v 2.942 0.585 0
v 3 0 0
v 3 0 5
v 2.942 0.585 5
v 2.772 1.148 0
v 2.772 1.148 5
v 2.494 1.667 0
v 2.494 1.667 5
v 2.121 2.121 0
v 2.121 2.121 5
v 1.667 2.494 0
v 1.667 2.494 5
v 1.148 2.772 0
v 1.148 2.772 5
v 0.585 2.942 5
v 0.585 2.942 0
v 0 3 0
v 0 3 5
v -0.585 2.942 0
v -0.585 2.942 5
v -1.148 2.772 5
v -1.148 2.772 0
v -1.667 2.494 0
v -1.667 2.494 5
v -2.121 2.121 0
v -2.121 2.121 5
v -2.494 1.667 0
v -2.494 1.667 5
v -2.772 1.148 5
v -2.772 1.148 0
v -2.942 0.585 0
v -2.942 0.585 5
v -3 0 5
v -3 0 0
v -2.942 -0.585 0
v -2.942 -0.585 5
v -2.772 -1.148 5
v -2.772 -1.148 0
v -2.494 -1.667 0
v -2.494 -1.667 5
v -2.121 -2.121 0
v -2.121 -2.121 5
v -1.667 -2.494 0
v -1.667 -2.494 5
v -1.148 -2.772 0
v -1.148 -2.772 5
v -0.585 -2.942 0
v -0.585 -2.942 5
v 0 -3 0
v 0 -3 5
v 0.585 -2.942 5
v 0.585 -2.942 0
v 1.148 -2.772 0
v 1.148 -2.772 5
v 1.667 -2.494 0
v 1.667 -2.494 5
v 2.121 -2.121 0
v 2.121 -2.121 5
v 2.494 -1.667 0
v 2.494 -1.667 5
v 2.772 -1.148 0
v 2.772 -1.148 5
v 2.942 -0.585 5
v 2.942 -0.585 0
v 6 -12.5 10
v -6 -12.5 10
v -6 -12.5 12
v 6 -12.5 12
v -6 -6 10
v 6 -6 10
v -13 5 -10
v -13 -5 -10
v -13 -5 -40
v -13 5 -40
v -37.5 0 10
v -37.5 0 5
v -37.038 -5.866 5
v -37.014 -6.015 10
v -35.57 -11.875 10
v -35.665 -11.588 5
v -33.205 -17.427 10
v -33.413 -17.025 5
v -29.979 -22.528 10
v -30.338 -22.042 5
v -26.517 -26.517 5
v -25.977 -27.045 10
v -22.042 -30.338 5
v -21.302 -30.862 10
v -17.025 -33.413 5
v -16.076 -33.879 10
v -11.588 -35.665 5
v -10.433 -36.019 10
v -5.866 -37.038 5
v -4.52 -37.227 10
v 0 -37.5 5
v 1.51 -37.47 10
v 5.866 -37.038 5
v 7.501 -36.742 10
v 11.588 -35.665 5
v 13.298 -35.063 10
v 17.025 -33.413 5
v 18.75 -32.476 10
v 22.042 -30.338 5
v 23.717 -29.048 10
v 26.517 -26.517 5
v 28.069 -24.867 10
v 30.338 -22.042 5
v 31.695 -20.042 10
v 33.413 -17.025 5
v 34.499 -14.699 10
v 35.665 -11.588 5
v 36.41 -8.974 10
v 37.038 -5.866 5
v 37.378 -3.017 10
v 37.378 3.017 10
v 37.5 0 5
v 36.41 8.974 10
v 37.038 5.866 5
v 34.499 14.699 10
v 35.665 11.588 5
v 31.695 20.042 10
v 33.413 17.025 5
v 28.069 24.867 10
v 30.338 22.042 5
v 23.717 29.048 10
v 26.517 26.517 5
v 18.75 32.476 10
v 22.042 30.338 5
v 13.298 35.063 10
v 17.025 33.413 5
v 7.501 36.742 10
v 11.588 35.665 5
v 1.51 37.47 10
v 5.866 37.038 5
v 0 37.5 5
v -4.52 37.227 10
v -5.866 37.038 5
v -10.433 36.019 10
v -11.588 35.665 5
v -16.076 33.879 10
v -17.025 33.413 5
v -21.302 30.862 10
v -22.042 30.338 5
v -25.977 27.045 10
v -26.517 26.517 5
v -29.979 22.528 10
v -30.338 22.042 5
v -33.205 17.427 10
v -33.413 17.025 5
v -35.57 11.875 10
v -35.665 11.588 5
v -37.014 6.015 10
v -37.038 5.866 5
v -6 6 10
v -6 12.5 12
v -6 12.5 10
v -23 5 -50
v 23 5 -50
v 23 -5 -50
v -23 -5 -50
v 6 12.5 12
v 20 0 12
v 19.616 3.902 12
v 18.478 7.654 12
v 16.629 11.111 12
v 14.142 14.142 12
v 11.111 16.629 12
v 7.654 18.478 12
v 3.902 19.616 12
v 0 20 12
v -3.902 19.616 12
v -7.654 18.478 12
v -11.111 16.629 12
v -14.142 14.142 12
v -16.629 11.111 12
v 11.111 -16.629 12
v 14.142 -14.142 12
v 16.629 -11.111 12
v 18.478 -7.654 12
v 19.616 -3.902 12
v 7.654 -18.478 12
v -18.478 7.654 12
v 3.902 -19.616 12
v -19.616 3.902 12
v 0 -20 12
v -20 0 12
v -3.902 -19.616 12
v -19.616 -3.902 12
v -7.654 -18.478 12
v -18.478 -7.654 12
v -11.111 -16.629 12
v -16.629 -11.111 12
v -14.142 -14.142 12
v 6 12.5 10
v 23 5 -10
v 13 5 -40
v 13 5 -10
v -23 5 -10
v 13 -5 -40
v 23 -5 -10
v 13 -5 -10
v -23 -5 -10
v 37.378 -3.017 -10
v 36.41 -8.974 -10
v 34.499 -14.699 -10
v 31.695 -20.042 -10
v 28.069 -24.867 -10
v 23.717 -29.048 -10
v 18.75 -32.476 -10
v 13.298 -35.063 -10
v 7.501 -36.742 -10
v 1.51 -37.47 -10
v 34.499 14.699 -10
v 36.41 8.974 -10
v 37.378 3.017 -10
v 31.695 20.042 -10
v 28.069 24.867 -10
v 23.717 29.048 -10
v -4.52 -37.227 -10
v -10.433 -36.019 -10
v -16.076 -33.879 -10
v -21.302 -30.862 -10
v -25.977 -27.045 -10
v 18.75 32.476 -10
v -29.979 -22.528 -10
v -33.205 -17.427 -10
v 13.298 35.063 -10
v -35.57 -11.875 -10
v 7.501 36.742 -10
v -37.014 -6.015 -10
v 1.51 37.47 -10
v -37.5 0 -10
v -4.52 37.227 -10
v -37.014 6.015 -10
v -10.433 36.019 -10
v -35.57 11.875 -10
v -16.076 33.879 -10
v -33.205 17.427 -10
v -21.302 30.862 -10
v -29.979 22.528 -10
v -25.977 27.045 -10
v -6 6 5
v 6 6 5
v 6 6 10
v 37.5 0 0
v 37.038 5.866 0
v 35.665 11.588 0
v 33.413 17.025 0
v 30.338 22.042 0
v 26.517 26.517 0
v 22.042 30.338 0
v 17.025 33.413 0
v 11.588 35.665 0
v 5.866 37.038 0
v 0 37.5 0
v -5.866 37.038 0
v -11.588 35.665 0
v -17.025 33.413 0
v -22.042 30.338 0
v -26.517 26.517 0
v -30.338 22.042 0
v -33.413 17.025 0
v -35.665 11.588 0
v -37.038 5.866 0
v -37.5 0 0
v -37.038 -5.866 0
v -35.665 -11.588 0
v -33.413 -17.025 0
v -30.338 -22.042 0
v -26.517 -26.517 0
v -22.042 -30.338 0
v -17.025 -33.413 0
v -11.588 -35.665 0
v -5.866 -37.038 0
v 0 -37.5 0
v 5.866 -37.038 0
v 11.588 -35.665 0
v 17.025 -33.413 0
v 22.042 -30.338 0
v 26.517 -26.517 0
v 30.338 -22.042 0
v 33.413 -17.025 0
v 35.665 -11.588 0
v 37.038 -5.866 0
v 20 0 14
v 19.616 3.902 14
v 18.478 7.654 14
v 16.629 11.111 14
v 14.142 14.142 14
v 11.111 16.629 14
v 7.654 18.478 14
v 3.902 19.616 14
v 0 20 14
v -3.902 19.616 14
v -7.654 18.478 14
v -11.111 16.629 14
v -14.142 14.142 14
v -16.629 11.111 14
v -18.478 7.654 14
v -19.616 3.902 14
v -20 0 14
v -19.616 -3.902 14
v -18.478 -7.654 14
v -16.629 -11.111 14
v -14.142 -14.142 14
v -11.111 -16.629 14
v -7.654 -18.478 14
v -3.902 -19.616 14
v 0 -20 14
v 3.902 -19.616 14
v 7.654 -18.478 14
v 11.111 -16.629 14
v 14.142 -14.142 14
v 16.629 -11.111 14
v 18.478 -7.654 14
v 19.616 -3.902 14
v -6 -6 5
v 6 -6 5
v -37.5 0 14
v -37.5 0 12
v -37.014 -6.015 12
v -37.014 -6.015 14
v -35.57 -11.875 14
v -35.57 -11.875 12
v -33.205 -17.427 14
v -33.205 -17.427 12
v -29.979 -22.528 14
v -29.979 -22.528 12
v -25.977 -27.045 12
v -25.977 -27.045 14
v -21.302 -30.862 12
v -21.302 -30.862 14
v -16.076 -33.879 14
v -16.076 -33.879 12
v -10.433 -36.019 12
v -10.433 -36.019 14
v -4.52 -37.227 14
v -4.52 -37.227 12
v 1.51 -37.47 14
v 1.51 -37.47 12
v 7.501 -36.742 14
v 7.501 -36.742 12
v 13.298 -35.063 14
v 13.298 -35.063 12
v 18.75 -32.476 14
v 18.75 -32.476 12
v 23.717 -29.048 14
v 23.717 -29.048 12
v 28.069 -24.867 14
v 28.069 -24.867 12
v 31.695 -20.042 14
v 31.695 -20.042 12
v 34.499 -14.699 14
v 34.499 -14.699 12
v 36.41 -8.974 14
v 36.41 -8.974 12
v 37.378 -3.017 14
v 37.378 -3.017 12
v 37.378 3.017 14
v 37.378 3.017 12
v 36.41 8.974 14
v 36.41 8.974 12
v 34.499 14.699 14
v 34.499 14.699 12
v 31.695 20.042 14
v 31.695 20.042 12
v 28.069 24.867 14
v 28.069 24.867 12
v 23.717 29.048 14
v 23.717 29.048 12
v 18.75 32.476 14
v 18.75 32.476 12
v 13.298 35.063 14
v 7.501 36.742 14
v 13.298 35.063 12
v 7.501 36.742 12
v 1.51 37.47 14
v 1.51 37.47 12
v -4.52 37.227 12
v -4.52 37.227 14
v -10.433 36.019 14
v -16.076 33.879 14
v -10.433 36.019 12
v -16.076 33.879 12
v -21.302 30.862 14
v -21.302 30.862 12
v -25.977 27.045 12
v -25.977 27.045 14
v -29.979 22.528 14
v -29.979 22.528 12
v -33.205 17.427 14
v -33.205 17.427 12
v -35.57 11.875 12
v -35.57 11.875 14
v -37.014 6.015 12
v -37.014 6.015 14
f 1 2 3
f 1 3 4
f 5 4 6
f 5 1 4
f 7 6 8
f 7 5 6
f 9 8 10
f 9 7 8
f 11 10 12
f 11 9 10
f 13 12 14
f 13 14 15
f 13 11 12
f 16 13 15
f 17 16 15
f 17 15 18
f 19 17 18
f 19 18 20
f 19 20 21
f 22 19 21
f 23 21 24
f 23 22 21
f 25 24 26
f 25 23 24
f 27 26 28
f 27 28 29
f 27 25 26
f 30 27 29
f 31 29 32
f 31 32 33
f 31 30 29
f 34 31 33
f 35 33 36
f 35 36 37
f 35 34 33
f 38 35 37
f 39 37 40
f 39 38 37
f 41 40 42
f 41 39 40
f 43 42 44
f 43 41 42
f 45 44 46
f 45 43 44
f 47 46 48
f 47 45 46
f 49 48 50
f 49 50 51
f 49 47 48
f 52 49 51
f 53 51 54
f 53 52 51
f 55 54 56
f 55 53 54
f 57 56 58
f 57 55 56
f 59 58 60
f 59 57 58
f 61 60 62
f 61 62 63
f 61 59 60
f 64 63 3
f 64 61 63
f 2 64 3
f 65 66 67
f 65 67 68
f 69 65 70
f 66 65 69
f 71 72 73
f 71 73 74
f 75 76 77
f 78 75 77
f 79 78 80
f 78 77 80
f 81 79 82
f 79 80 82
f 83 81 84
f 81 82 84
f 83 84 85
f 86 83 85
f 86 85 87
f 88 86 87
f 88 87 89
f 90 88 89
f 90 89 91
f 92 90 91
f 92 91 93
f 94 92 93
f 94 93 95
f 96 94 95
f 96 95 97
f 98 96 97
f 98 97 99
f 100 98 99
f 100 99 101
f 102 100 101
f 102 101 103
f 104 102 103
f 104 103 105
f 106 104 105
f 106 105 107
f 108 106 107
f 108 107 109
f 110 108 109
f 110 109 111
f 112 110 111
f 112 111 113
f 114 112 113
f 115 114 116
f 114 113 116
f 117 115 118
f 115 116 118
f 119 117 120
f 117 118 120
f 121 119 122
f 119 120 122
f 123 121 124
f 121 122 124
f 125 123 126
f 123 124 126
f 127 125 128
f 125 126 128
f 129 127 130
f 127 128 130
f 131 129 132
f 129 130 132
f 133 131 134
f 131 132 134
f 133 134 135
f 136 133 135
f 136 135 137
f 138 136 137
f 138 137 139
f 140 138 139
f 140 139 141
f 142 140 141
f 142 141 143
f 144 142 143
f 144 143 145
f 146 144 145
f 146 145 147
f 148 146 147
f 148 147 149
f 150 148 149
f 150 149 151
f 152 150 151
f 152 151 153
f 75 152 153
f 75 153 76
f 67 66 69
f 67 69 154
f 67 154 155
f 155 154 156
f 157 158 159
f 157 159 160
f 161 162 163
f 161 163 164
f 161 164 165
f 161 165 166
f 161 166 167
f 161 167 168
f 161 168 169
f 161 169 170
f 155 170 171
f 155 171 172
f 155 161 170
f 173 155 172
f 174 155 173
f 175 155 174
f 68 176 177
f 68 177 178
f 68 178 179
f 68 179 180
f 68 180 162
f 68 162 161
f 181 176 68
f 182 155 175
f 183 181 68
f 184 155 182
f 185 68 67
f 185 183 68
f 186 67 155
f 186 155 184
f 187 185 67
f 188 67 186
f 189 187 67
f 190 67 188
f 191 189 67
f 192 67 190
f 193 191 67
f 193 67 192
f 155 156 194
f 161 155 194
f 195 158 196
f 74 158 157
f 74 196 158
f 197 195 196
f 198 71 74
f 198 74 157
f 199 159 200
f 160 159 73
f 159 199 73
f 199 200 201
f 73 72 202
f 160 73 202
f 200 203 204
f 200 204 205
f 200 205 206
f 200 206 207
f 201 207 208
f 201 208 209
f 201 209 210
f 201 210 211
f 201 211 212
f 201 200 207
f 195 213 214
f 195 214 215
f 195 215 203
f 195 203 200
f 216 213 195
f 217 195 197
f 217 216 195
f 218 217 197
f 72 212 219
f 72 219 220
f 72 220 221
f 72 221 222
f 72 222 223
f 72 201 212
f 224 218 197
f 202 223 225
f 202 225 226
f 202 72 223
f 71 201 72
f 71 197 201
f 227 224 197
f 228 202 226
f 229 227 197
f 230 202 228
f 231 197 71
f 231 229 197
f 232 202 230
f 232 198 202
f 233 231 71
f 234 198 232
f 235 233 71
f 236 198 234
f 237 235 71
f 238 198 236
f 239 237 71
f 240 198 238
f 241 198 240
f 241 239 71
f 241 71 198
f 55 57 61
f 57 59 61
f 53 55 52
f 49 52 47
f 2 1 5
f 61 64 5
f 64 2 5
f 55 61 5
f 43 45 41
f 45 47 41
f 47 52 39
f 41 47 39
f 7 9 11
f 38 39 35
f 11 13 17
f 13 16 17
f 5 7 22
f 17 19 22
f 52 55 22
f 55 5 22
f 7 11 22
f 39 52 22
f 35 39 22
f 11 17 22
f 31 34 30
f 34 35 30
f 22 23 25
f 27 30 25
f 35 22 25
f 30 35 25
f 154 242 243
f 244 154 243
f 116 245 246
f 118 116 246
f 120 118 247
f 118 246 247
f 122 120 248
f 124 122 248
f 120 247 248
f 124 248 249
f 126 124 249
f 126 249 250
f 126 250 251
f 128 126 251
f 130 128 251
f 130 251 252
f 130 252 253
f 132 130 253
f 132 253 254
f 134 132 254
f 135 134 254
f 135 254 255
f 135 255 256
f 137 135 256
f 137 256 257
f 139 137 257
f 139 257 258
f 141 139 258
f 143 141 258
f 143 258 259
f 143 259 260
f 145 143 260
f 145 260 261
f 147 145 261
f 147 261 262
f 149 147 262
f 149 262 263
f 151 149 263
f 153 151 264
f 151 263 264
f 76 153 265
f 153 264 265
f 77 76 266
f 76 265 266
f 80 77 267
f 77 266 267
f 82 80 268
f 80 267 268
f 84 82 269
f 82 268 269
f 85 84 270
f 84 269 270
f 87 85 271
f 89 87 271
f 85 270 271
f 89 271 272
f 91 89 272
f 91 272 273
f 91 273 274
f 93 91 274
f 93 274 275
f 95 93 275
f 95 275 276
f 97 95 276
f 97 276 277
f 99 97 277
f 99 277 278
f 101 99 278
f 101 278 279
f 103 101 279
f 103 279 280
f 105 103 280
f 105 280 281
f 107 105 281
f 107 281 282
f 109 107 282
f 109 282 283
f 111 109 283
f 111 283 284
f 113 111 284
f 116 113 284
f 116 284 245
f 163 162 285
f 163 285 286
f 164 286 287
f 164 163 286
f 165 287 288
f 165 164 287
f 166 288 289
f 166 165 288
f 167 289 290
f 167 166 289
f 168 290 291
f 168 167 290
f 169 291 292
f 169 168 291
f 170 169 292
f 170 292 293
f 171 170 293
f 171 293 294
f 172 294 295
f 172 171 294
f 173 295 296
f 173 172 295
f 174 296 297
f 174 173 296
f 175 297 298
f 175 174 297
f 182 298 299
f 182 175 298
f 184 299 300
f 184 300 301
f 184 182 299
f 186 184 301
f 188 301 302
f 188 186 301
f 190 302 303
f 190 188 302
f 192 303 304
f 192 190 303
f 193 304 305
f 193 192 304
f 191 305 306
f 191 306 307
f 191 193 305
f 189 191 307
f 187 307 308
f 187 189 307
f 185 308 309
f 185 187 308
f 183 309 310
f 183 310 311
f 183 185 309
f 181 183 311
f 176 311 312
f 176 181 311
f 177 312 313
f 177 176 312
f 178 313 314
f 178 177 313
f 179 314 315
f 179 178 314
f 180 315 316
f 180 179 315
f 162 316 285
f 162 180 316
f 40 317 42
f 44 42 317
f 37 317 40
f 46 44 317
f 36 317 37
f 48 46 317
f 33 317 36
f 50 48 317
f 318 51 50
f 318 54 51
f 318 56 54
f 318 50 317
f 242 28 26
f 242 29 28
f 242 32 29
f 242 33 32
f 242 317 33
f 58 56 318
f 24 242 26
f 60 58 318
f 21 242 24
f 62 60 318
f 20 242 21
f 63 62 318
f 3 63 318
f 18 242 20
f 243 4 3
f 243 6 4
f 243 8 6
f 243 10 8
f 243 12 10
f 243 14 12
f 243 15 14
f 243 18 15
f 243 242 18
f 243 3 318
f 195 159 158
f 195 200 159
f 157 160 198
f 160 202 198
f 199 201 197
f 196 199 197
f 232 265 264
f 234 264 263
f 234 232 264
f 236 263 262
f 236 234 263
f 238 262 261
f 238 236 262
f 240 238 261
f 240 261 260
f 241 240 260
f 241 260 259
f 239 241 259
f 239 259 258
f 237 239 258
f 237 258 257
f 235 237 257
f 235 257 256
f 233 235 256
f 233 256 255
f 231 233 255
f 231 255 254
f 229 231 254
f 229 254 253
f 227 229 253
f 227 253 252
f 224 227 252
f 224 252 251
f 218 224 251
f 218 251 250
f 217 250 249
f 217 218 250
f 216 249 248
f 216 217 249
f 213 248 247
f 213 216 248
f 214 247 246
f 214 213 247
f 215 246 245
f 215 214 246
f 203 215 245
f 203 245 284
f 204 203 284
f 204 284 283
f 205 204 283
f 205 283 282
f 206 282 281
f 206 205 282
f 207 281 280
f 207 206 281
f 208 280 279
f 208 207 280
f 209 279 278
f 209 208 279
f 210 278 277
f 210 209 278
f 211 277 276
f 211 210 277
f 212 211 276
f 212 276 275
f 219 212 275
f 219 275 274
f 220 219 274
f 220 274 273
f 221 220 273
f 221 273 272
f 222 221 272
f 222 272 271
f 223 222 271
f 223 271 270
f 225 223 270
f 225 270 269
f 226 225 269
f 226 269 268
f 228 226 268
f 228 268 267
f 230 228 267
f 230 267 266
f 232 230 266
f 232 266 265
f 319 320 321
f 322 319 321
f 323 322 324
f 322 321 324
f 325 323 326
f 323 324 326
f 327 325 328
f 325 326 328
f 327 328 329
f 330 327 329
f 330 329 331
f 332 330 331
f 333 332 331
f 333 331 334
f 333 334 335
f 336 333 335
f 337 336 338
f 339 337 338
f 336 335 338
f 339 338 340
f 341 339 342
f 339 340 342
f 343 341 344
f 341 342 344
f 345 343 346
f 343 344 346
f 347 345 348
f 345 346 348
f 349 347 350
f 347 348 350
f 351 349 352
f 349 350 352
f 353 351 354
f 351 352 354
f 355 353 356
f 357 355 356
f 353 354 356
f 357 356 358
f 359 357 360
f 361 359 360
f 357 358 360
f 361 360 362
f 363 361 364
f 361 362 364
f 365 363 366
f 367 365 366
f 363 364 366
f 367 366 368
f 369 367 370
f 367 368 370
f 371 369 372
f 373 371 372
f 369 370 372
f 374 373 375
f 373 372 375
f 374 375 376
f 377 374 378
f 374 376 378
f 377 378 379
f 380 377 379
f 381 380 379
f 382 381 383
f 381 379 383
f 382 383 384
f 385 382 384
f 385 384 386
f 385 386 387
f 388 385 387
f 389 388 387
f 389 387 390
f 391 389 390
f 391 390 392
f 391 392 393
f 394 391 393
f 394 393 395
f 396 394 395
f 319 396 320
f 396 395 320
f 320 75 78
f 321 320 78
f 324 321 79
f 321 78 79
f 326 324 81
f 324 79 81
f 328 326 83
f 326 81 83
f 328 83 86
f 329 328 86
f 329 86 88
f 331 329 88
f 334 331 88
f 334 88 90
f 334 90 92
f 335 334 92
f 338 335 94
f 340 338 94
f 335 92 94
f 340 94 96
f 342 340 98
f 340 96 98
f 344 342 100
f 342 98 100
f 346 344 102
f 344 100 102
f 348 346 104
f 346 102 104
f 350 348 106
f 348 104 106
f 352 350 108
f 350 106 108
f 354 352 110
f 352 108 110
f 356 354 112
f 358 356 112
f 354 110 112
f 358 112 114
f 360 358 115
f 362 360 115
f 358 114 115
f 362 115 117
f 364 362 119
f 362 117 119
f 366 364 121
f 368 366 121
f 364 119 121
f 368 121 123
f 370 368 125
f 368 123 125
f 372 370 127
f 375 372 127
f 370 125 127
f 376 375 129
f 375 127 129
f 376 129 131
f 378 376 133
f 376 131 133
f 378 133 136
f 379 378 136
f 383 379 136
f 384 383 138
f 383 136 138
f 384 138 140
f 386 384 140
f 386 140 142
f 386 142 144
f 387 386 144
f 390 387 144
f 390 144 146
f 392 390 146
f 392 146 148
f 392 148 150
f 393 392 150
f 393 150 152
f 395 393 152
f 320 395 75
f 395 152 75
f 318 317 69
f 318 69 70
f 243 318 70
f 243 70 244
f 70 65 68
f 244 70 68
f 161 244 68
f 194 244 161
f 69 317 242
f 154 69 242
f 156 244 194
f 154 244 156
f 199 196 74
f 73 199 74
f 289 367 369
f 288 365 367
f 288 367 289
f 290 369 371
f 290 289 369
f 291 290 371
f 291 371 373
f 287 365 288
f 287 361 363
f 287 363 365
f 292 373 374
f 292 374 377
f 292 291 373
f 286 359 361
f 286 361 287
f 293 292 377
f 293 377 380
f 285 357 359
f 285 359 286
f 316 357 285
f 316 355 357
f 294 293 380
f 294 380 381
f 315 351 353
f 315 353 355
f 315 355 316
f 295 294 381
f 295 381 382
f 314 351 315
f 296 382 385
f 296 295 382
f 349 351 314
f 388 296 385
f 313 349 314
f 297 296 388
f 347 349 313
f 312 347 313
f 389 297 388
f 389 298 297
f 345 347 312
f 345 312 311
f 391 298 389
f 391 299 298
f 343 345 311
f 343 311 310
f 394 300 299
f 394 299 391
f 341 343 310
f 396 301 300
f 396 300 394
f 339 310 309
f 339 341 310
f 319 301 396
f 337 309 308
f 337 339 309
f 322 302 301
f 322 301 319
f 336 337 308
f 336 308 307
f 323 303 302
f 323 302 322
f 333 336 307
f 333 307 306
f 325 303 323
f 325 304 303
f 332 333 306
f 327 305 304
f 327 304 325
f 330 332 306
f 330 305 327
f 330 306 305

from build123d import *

# Parameters (mm, degrees)
SKETCH_1_R      = 37.5
SKETCH_1_R_2    = 3
EXTRUDE_1_DEPTH = 5
EXTRUDE_START   = 10
SKETCH_2_R      = 37.5
EXTRUDE_2_DEPTH = 10
SKETCH_4_R      = 37.5
SKETCH_4_W      = 12
SKETCH_4_H      = 12
EXTRUDE_3_DEPTH = 5
SKETCH_6_R      = 37.5
SKETCH_6_W      = 12
SKETCH_6_H      = 25
EXTRUDE_4_DEPTH = 2
SKETCH_11_R     = 37.5
SKETCH_11_R_2   = 20
EXTRUDE_6_DEPTH = 2
SKETCH_13_W     = 10
SKETCH_13_H     = 10
EXTRUDE_7_DEPTH = 30
SKETCH_14_W     = 46
SKETCH_14_H     = 10
EXTRUDE_8_DEPTH = 10


with BuildPart() as part:
    # Эскиз1 → Бобышка-Вытянуть1 (new body)
    with BuildSketch(Plane.XY):
        Circle(SKETCH_1_R)
        Circle(SKETCH_1_R_2, mode=Mode.SUBTRACT)
    extrude(amount=EXTRUDE_1_DEPTH)

    # Эскиз2 → Бобышка-Вытянуть2 (add)
    with BuildSketch(Plane(origin=(0, 0, 0), x_dir=(-1, 0, 0), z_dir=(0, 0, -1)).offset(EXTRUDE_START)):
        Circle(SKETCH_2_R)
    extrude(amount=-EXTRUDE_2_DEPTH)

    # Эскиз4 → Бобышка-Вытянуть3 (add)
    with BuildSketch(Plane.XY.offset(5)):
        with Locations(Location((0, 0, 0), (0, 0, 180))):
            Circle(SKETCH_4_R)
        Rectangle(SKETCH_4_W, SKETCH_4_H, mode=Mode.SUBTRACT)
    extrude(amount=EXTRUDE_3_DEPTH)

    # Эскиз6 → Бобышка-Вытянуть4 (add)
    with BuildSketch(Plane.XY.offset(10)):
        with Locations(Location((0, 0, 0), (0, 0, 180))):
            Circle(SKETCH_6_R)
        Rectangle(SKETCH_6_W, SKETCH_6_H, mode=Mode.SUBTRACT)
    extrude(amount=EXTRUDE_4_DEPTH)

    # Эскиз11 → Бобышка-Вытянуть6 (add)
    with BuildSketch(Plane.XY.offset(12)):
        with Locations(Location((0, 0, 0), (0, 0, 180))):
            Circle(SKETCH_11_R)
        Circle(SKETCH_11_R_2, mode=Mode.SUBTRACT)
    extrude(amount=EXTRUDE_6_DEPTH)

    # Эскиз13 → Бобышка-Вытянуть7 (add)
    with BuildSketch(Plane(origin=(0, 0, -10), x_dir=(-1, 0, 0), z_dir=(0, 0, -1))):
        with Locations((-18, 0)):
            Rectangle(SKETCH_13_W, SKETCH_13_H)
        with Locations((18, 0)):
            Rectangle(SKETCH_13_W, SKETCH_13_H)
    extrude(amount=EXTRUDE_7_DEPTH)

    # Эскиз14 → Бобышка-Вытянуть8 (add)
    with BuildSketch(Plane(origin=(0, 0, -40), x_dir=(-1, 0, 0), z_dir=(0, 0, -1))):
        Rectangle(SKETCH_14_W, SKETCH_14_H)
    extrude(amount=EXTRUDE_8_DEPTH)


solid = part.part
